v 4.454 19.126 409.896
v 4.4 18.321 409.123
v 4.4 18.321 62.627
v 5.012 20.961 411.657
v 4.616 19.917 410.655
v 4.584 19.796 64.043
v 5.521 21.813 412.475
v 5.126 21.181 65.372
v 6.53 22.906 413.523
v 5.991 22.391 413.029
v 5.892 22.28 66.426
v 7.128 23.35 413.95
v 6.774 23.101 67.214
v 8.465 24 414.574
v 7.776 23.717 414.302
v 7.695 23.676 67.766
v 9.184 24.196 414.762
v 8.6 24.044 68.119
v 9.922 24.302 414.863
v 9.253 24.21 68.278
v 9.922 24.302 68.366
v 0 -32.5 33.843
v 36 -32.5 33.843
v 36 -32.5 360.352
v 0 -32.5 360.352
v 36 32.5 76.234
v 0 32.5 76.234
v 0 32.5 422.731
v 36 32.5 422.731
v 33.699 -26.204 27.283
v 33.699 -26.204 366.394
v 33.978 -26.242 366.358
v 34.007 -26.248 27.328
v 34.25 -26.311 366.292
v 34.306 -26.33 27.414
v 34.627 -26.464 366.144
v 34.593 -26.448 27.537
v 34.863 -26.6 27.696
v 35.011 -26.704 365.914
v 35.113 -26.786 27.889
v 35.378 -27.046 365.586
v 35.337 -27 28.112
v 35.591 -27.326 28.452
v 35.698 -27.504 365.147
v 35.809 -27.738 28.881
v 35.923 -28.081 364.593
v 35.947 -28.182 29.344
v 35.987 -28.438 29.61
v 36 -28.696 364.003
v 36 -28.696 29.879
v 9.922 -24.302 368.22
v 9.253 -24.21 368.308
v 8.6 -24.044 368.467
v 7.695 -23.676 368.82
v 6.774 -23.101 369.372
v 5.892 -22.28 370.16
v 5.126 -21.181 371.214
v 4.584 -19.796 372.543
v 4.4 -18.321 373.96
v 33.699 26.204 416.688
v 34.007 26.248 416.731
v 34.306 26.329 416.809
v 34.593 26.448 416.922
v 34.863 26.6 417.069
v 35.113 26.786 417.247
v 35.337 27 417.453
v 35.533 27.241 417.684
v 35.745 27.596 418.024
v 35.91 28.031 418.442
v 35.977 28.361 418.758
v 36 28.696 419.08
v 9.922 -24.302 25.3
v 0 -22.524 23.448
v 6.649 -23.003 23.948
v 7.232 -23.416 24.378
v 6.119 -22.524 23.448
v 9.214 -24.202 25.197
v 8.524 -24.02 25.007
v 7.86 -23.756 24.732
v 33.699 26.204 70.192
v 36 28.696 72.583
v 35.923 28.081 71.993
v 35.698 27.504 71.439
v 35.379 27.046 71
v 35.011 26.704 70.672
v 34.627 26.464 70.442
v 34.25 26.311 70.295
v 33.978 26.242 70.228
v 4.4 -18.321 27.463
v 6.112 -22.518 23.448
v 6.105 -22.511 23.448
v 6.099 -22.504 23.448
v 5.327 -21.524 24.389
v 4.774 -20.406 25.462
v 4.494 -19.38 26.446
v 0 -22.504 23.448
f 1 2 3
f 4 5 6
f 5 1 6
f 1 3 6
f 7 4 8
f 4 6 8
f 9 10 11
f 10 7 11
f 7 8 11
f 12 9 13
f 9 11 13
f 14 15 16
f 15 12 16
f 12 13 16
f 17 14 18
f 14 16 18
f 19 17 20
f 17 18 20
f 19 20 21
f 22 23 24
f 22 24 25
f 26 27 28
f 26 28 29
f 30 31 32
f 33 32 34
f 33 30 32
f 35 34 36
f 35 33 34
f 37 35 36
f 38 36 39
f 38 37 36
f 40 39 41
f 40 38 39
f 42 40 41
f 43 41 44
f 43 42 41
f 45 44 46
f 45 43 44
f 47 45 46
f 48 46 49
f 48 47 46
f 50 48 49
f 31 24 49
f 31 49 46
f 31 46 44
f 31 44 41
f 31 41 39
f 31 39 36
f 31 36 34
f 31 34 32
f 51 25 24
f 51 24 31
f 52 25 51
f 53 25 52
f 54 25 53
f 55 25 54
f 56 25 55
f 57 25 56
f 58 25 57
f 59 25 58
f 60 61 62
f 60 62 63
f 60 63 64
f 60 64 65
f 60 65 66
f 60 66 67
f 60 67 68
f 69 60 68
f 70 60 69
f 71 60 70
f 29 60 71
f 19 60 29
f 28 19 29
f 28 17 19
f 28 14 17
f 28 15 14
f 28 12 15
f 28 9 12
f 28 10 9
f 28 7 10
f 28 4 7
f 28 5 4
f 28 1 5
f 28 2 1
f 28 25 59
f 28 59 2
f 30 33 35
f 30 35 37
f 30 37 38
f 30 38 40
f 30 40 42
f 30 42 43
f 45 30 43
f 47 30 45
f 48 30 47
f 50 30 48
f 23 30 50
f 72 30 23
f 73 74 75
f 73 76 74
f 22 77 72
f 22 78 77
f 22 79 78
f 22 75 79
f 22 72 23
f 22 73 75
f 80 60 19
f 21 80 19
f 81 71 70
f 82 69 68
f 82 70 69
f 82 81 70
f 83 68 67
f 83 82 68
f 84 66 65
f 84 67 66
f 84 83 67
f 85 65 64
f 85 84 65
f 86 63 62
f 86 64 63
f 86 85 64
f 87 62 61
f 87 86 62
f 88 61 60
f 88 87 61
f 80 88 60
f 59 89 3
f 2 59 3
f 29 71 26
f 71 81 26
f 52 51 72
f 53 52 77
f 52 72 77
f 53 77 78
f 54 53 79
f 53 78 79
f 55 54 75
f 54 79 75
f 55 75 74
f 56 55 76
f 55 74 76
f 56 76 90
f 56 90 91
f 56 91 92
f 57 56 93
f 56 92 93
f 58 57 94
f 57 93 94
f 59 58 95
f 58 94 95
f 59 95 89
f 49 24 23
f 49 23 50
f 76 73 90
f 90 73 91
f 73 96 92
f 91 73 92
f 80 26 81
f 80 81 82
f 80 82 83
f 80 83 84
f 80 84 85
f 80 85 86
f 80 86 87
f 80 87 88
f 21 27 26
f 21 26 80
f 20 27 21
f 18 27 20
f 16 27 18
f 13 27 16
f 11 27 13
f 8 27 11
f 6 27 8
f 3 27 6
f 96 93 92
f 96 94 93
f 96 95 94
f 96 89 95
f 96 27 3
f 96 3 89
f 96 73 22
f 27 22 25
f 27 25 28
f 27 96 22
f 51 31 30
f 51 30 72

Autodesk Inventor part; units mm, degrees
ref_plane "Начальная плоскость" through (0, 0, 23.4485) normal (0, 0, 1) x (1, 0, 0)
ref_plane "Конечная плоскость" through (0, 0, 422.7409) normal (0, 0, 1) x (1, 0, 0)
sketch "Эскиз" plane through (0, 0, 0) normal (0, 0, 1) x (1, 0, 0)
  line L0 (36, -32.5) -> (0, -32.5)
  line L1 (36, -32.5) -> (36, -28.696)
  line L2 (33.6994, -26.2039) -> (9.9215, -24.3017)
  line L3 (4.4, -18.3208) -> (4.4, 18.3208)
  line L4 (33.6994, 26.2039) -> (9.9215, 24.3017)
  line L5 (36, 28.696) -> (36, 32.5)
  line L6 (0, 32.5) -> (36, 32.5)
  line L7 (0, -32.5) -> (0, 32.5)
  arc A0 (4.4, -18.3208) -> (9.9215, -24.3017) centre (10.4, -18.3208) ccw
  arc A1 (9.9215, 24.3017) -> (4.4, 18.3208) centre (10.4, 18.3208) ccw
  arc A2 (36, -28.696) -> (33.6994, -26.2039) centre (33.5, -28.696) ccw
  arc A3 (33.6994, 26.2039) -> (36, 28.696) centre (33.5, 28.696) ccw
  line L8 (0, 45.5) -> (0, -45.5) construction
  line L9 (-7.2974, 0) -> (43.7847, 0) construction
  point P0 (36, -26.388)
  point P1 (4.4, -23.86)
  point P2 (4.4, 23.86)
  point P3 (36, 26.388)
  dimension "d3" = 36
  dimension "d5" = 4.4
  dimension "d7" = 65
  dimension "d9" = 8.64
  dimension "d11" = 8.64
  dimension "d13" = 6.112
  dimension "d15" = 6.112
  dimension "d22" = 6
  dimension "d23" = 2.5
  dimension "d24" = 32.5
  dimension "d25" = 0
extrude "Тело" add sketch "Эскиз" along normal up to surface (399.2924 mm away) from surface at 23.4485
sketch "Sketch3" plane through (0, 0, 0) normal (0, 0, 1) x (1, 0, 0)
  line L0 (0, 0) -> (10, 0)
ref_plane "Work Plane7" through (0, 0, 0) normal (0, -1, 0) x (1, 0, 0)
sketch "Sketch4" plane through (0, 0, 0) normal (0, -1, 0) x (1, 0, 0)
  line L0 (-2, 23.4485) -> (12, 23.4485)
  line L1 (-2, 422.7409) -> (12, 422.7409)
  dimension "d29" = 399.2924
ref_plane "РабПлоскость8" through (0, -195.6097, 203.8212) normal (0, -0.6924, 0.7215) x (1, 0, 0)
split "Разделение1" plane through (0, -195.6097, 203.8212) removes the side toward (0, -0.6924, 0.7215)
ref_plane "РабПлоскость9" through (36, -22.5038, 23.4485) normal (0, 0.6924, -0.7215) x (1, 0, 0)
split "Разделение2" plane through (36, -22.5038, 23.4485) removes the side toward (0, 0.6924, -0.7215)
ref_plane "РабПлоскость10" through (-29, -461.8467, 481.2345) normal (0, -0.7215, -0.6924) x (1, 0, 0)
split "Разделение3" plane through (-29, -461.8467, 481.2345) removes the side toward (0, -0.7215, -0.6924)
equation "\"d3\" = b"
equation "\"d5\" = t1"
equation "\"d7\" = ParH"
equation "\"d9\" = msp_x1 + t2"
equation "\"d11\" = msp_x1 + t2"
equation "\"d13\" = -msp_x2 + t2"
equation "\"d15\" = -msp_x2 + t2"
equation "\"d22\" = R"
equation "\"d23\" = R1"
equation "\"d24\" = 0.5 * d7"
equation "\"d16\" = G_L"
equation "\"R1\" = 2.5"
equation "\"R\" = 6"
equation "\"t1\" = 4.4"
equation "\"t2\" = 7.2"
equation "\"ParH\" = 65"
equation "\"b\" = 36"
equation "\"msp_x1\" = 0.04 * b"
equation "\"msp_x2\" = -0.08 * t1 + 0.04 * b"
equation "\"G_L\" = d29"
equation "\"ex\" = 0"
equation "\"G_OFFSET_START\" = -23.44846"
equation "\"G_OFFSET_END\" = -58.90056"
equation "\"d26\" = -G_OFFSET_START"
equation "\"d27\" = G_OFFSET_END + B_L"
equation "\"B_L\" = 481.64146"
properties part number "Швеллер 6.5U-399,29 ГОСТ 8240-97" material "Сталь, мягкая"
